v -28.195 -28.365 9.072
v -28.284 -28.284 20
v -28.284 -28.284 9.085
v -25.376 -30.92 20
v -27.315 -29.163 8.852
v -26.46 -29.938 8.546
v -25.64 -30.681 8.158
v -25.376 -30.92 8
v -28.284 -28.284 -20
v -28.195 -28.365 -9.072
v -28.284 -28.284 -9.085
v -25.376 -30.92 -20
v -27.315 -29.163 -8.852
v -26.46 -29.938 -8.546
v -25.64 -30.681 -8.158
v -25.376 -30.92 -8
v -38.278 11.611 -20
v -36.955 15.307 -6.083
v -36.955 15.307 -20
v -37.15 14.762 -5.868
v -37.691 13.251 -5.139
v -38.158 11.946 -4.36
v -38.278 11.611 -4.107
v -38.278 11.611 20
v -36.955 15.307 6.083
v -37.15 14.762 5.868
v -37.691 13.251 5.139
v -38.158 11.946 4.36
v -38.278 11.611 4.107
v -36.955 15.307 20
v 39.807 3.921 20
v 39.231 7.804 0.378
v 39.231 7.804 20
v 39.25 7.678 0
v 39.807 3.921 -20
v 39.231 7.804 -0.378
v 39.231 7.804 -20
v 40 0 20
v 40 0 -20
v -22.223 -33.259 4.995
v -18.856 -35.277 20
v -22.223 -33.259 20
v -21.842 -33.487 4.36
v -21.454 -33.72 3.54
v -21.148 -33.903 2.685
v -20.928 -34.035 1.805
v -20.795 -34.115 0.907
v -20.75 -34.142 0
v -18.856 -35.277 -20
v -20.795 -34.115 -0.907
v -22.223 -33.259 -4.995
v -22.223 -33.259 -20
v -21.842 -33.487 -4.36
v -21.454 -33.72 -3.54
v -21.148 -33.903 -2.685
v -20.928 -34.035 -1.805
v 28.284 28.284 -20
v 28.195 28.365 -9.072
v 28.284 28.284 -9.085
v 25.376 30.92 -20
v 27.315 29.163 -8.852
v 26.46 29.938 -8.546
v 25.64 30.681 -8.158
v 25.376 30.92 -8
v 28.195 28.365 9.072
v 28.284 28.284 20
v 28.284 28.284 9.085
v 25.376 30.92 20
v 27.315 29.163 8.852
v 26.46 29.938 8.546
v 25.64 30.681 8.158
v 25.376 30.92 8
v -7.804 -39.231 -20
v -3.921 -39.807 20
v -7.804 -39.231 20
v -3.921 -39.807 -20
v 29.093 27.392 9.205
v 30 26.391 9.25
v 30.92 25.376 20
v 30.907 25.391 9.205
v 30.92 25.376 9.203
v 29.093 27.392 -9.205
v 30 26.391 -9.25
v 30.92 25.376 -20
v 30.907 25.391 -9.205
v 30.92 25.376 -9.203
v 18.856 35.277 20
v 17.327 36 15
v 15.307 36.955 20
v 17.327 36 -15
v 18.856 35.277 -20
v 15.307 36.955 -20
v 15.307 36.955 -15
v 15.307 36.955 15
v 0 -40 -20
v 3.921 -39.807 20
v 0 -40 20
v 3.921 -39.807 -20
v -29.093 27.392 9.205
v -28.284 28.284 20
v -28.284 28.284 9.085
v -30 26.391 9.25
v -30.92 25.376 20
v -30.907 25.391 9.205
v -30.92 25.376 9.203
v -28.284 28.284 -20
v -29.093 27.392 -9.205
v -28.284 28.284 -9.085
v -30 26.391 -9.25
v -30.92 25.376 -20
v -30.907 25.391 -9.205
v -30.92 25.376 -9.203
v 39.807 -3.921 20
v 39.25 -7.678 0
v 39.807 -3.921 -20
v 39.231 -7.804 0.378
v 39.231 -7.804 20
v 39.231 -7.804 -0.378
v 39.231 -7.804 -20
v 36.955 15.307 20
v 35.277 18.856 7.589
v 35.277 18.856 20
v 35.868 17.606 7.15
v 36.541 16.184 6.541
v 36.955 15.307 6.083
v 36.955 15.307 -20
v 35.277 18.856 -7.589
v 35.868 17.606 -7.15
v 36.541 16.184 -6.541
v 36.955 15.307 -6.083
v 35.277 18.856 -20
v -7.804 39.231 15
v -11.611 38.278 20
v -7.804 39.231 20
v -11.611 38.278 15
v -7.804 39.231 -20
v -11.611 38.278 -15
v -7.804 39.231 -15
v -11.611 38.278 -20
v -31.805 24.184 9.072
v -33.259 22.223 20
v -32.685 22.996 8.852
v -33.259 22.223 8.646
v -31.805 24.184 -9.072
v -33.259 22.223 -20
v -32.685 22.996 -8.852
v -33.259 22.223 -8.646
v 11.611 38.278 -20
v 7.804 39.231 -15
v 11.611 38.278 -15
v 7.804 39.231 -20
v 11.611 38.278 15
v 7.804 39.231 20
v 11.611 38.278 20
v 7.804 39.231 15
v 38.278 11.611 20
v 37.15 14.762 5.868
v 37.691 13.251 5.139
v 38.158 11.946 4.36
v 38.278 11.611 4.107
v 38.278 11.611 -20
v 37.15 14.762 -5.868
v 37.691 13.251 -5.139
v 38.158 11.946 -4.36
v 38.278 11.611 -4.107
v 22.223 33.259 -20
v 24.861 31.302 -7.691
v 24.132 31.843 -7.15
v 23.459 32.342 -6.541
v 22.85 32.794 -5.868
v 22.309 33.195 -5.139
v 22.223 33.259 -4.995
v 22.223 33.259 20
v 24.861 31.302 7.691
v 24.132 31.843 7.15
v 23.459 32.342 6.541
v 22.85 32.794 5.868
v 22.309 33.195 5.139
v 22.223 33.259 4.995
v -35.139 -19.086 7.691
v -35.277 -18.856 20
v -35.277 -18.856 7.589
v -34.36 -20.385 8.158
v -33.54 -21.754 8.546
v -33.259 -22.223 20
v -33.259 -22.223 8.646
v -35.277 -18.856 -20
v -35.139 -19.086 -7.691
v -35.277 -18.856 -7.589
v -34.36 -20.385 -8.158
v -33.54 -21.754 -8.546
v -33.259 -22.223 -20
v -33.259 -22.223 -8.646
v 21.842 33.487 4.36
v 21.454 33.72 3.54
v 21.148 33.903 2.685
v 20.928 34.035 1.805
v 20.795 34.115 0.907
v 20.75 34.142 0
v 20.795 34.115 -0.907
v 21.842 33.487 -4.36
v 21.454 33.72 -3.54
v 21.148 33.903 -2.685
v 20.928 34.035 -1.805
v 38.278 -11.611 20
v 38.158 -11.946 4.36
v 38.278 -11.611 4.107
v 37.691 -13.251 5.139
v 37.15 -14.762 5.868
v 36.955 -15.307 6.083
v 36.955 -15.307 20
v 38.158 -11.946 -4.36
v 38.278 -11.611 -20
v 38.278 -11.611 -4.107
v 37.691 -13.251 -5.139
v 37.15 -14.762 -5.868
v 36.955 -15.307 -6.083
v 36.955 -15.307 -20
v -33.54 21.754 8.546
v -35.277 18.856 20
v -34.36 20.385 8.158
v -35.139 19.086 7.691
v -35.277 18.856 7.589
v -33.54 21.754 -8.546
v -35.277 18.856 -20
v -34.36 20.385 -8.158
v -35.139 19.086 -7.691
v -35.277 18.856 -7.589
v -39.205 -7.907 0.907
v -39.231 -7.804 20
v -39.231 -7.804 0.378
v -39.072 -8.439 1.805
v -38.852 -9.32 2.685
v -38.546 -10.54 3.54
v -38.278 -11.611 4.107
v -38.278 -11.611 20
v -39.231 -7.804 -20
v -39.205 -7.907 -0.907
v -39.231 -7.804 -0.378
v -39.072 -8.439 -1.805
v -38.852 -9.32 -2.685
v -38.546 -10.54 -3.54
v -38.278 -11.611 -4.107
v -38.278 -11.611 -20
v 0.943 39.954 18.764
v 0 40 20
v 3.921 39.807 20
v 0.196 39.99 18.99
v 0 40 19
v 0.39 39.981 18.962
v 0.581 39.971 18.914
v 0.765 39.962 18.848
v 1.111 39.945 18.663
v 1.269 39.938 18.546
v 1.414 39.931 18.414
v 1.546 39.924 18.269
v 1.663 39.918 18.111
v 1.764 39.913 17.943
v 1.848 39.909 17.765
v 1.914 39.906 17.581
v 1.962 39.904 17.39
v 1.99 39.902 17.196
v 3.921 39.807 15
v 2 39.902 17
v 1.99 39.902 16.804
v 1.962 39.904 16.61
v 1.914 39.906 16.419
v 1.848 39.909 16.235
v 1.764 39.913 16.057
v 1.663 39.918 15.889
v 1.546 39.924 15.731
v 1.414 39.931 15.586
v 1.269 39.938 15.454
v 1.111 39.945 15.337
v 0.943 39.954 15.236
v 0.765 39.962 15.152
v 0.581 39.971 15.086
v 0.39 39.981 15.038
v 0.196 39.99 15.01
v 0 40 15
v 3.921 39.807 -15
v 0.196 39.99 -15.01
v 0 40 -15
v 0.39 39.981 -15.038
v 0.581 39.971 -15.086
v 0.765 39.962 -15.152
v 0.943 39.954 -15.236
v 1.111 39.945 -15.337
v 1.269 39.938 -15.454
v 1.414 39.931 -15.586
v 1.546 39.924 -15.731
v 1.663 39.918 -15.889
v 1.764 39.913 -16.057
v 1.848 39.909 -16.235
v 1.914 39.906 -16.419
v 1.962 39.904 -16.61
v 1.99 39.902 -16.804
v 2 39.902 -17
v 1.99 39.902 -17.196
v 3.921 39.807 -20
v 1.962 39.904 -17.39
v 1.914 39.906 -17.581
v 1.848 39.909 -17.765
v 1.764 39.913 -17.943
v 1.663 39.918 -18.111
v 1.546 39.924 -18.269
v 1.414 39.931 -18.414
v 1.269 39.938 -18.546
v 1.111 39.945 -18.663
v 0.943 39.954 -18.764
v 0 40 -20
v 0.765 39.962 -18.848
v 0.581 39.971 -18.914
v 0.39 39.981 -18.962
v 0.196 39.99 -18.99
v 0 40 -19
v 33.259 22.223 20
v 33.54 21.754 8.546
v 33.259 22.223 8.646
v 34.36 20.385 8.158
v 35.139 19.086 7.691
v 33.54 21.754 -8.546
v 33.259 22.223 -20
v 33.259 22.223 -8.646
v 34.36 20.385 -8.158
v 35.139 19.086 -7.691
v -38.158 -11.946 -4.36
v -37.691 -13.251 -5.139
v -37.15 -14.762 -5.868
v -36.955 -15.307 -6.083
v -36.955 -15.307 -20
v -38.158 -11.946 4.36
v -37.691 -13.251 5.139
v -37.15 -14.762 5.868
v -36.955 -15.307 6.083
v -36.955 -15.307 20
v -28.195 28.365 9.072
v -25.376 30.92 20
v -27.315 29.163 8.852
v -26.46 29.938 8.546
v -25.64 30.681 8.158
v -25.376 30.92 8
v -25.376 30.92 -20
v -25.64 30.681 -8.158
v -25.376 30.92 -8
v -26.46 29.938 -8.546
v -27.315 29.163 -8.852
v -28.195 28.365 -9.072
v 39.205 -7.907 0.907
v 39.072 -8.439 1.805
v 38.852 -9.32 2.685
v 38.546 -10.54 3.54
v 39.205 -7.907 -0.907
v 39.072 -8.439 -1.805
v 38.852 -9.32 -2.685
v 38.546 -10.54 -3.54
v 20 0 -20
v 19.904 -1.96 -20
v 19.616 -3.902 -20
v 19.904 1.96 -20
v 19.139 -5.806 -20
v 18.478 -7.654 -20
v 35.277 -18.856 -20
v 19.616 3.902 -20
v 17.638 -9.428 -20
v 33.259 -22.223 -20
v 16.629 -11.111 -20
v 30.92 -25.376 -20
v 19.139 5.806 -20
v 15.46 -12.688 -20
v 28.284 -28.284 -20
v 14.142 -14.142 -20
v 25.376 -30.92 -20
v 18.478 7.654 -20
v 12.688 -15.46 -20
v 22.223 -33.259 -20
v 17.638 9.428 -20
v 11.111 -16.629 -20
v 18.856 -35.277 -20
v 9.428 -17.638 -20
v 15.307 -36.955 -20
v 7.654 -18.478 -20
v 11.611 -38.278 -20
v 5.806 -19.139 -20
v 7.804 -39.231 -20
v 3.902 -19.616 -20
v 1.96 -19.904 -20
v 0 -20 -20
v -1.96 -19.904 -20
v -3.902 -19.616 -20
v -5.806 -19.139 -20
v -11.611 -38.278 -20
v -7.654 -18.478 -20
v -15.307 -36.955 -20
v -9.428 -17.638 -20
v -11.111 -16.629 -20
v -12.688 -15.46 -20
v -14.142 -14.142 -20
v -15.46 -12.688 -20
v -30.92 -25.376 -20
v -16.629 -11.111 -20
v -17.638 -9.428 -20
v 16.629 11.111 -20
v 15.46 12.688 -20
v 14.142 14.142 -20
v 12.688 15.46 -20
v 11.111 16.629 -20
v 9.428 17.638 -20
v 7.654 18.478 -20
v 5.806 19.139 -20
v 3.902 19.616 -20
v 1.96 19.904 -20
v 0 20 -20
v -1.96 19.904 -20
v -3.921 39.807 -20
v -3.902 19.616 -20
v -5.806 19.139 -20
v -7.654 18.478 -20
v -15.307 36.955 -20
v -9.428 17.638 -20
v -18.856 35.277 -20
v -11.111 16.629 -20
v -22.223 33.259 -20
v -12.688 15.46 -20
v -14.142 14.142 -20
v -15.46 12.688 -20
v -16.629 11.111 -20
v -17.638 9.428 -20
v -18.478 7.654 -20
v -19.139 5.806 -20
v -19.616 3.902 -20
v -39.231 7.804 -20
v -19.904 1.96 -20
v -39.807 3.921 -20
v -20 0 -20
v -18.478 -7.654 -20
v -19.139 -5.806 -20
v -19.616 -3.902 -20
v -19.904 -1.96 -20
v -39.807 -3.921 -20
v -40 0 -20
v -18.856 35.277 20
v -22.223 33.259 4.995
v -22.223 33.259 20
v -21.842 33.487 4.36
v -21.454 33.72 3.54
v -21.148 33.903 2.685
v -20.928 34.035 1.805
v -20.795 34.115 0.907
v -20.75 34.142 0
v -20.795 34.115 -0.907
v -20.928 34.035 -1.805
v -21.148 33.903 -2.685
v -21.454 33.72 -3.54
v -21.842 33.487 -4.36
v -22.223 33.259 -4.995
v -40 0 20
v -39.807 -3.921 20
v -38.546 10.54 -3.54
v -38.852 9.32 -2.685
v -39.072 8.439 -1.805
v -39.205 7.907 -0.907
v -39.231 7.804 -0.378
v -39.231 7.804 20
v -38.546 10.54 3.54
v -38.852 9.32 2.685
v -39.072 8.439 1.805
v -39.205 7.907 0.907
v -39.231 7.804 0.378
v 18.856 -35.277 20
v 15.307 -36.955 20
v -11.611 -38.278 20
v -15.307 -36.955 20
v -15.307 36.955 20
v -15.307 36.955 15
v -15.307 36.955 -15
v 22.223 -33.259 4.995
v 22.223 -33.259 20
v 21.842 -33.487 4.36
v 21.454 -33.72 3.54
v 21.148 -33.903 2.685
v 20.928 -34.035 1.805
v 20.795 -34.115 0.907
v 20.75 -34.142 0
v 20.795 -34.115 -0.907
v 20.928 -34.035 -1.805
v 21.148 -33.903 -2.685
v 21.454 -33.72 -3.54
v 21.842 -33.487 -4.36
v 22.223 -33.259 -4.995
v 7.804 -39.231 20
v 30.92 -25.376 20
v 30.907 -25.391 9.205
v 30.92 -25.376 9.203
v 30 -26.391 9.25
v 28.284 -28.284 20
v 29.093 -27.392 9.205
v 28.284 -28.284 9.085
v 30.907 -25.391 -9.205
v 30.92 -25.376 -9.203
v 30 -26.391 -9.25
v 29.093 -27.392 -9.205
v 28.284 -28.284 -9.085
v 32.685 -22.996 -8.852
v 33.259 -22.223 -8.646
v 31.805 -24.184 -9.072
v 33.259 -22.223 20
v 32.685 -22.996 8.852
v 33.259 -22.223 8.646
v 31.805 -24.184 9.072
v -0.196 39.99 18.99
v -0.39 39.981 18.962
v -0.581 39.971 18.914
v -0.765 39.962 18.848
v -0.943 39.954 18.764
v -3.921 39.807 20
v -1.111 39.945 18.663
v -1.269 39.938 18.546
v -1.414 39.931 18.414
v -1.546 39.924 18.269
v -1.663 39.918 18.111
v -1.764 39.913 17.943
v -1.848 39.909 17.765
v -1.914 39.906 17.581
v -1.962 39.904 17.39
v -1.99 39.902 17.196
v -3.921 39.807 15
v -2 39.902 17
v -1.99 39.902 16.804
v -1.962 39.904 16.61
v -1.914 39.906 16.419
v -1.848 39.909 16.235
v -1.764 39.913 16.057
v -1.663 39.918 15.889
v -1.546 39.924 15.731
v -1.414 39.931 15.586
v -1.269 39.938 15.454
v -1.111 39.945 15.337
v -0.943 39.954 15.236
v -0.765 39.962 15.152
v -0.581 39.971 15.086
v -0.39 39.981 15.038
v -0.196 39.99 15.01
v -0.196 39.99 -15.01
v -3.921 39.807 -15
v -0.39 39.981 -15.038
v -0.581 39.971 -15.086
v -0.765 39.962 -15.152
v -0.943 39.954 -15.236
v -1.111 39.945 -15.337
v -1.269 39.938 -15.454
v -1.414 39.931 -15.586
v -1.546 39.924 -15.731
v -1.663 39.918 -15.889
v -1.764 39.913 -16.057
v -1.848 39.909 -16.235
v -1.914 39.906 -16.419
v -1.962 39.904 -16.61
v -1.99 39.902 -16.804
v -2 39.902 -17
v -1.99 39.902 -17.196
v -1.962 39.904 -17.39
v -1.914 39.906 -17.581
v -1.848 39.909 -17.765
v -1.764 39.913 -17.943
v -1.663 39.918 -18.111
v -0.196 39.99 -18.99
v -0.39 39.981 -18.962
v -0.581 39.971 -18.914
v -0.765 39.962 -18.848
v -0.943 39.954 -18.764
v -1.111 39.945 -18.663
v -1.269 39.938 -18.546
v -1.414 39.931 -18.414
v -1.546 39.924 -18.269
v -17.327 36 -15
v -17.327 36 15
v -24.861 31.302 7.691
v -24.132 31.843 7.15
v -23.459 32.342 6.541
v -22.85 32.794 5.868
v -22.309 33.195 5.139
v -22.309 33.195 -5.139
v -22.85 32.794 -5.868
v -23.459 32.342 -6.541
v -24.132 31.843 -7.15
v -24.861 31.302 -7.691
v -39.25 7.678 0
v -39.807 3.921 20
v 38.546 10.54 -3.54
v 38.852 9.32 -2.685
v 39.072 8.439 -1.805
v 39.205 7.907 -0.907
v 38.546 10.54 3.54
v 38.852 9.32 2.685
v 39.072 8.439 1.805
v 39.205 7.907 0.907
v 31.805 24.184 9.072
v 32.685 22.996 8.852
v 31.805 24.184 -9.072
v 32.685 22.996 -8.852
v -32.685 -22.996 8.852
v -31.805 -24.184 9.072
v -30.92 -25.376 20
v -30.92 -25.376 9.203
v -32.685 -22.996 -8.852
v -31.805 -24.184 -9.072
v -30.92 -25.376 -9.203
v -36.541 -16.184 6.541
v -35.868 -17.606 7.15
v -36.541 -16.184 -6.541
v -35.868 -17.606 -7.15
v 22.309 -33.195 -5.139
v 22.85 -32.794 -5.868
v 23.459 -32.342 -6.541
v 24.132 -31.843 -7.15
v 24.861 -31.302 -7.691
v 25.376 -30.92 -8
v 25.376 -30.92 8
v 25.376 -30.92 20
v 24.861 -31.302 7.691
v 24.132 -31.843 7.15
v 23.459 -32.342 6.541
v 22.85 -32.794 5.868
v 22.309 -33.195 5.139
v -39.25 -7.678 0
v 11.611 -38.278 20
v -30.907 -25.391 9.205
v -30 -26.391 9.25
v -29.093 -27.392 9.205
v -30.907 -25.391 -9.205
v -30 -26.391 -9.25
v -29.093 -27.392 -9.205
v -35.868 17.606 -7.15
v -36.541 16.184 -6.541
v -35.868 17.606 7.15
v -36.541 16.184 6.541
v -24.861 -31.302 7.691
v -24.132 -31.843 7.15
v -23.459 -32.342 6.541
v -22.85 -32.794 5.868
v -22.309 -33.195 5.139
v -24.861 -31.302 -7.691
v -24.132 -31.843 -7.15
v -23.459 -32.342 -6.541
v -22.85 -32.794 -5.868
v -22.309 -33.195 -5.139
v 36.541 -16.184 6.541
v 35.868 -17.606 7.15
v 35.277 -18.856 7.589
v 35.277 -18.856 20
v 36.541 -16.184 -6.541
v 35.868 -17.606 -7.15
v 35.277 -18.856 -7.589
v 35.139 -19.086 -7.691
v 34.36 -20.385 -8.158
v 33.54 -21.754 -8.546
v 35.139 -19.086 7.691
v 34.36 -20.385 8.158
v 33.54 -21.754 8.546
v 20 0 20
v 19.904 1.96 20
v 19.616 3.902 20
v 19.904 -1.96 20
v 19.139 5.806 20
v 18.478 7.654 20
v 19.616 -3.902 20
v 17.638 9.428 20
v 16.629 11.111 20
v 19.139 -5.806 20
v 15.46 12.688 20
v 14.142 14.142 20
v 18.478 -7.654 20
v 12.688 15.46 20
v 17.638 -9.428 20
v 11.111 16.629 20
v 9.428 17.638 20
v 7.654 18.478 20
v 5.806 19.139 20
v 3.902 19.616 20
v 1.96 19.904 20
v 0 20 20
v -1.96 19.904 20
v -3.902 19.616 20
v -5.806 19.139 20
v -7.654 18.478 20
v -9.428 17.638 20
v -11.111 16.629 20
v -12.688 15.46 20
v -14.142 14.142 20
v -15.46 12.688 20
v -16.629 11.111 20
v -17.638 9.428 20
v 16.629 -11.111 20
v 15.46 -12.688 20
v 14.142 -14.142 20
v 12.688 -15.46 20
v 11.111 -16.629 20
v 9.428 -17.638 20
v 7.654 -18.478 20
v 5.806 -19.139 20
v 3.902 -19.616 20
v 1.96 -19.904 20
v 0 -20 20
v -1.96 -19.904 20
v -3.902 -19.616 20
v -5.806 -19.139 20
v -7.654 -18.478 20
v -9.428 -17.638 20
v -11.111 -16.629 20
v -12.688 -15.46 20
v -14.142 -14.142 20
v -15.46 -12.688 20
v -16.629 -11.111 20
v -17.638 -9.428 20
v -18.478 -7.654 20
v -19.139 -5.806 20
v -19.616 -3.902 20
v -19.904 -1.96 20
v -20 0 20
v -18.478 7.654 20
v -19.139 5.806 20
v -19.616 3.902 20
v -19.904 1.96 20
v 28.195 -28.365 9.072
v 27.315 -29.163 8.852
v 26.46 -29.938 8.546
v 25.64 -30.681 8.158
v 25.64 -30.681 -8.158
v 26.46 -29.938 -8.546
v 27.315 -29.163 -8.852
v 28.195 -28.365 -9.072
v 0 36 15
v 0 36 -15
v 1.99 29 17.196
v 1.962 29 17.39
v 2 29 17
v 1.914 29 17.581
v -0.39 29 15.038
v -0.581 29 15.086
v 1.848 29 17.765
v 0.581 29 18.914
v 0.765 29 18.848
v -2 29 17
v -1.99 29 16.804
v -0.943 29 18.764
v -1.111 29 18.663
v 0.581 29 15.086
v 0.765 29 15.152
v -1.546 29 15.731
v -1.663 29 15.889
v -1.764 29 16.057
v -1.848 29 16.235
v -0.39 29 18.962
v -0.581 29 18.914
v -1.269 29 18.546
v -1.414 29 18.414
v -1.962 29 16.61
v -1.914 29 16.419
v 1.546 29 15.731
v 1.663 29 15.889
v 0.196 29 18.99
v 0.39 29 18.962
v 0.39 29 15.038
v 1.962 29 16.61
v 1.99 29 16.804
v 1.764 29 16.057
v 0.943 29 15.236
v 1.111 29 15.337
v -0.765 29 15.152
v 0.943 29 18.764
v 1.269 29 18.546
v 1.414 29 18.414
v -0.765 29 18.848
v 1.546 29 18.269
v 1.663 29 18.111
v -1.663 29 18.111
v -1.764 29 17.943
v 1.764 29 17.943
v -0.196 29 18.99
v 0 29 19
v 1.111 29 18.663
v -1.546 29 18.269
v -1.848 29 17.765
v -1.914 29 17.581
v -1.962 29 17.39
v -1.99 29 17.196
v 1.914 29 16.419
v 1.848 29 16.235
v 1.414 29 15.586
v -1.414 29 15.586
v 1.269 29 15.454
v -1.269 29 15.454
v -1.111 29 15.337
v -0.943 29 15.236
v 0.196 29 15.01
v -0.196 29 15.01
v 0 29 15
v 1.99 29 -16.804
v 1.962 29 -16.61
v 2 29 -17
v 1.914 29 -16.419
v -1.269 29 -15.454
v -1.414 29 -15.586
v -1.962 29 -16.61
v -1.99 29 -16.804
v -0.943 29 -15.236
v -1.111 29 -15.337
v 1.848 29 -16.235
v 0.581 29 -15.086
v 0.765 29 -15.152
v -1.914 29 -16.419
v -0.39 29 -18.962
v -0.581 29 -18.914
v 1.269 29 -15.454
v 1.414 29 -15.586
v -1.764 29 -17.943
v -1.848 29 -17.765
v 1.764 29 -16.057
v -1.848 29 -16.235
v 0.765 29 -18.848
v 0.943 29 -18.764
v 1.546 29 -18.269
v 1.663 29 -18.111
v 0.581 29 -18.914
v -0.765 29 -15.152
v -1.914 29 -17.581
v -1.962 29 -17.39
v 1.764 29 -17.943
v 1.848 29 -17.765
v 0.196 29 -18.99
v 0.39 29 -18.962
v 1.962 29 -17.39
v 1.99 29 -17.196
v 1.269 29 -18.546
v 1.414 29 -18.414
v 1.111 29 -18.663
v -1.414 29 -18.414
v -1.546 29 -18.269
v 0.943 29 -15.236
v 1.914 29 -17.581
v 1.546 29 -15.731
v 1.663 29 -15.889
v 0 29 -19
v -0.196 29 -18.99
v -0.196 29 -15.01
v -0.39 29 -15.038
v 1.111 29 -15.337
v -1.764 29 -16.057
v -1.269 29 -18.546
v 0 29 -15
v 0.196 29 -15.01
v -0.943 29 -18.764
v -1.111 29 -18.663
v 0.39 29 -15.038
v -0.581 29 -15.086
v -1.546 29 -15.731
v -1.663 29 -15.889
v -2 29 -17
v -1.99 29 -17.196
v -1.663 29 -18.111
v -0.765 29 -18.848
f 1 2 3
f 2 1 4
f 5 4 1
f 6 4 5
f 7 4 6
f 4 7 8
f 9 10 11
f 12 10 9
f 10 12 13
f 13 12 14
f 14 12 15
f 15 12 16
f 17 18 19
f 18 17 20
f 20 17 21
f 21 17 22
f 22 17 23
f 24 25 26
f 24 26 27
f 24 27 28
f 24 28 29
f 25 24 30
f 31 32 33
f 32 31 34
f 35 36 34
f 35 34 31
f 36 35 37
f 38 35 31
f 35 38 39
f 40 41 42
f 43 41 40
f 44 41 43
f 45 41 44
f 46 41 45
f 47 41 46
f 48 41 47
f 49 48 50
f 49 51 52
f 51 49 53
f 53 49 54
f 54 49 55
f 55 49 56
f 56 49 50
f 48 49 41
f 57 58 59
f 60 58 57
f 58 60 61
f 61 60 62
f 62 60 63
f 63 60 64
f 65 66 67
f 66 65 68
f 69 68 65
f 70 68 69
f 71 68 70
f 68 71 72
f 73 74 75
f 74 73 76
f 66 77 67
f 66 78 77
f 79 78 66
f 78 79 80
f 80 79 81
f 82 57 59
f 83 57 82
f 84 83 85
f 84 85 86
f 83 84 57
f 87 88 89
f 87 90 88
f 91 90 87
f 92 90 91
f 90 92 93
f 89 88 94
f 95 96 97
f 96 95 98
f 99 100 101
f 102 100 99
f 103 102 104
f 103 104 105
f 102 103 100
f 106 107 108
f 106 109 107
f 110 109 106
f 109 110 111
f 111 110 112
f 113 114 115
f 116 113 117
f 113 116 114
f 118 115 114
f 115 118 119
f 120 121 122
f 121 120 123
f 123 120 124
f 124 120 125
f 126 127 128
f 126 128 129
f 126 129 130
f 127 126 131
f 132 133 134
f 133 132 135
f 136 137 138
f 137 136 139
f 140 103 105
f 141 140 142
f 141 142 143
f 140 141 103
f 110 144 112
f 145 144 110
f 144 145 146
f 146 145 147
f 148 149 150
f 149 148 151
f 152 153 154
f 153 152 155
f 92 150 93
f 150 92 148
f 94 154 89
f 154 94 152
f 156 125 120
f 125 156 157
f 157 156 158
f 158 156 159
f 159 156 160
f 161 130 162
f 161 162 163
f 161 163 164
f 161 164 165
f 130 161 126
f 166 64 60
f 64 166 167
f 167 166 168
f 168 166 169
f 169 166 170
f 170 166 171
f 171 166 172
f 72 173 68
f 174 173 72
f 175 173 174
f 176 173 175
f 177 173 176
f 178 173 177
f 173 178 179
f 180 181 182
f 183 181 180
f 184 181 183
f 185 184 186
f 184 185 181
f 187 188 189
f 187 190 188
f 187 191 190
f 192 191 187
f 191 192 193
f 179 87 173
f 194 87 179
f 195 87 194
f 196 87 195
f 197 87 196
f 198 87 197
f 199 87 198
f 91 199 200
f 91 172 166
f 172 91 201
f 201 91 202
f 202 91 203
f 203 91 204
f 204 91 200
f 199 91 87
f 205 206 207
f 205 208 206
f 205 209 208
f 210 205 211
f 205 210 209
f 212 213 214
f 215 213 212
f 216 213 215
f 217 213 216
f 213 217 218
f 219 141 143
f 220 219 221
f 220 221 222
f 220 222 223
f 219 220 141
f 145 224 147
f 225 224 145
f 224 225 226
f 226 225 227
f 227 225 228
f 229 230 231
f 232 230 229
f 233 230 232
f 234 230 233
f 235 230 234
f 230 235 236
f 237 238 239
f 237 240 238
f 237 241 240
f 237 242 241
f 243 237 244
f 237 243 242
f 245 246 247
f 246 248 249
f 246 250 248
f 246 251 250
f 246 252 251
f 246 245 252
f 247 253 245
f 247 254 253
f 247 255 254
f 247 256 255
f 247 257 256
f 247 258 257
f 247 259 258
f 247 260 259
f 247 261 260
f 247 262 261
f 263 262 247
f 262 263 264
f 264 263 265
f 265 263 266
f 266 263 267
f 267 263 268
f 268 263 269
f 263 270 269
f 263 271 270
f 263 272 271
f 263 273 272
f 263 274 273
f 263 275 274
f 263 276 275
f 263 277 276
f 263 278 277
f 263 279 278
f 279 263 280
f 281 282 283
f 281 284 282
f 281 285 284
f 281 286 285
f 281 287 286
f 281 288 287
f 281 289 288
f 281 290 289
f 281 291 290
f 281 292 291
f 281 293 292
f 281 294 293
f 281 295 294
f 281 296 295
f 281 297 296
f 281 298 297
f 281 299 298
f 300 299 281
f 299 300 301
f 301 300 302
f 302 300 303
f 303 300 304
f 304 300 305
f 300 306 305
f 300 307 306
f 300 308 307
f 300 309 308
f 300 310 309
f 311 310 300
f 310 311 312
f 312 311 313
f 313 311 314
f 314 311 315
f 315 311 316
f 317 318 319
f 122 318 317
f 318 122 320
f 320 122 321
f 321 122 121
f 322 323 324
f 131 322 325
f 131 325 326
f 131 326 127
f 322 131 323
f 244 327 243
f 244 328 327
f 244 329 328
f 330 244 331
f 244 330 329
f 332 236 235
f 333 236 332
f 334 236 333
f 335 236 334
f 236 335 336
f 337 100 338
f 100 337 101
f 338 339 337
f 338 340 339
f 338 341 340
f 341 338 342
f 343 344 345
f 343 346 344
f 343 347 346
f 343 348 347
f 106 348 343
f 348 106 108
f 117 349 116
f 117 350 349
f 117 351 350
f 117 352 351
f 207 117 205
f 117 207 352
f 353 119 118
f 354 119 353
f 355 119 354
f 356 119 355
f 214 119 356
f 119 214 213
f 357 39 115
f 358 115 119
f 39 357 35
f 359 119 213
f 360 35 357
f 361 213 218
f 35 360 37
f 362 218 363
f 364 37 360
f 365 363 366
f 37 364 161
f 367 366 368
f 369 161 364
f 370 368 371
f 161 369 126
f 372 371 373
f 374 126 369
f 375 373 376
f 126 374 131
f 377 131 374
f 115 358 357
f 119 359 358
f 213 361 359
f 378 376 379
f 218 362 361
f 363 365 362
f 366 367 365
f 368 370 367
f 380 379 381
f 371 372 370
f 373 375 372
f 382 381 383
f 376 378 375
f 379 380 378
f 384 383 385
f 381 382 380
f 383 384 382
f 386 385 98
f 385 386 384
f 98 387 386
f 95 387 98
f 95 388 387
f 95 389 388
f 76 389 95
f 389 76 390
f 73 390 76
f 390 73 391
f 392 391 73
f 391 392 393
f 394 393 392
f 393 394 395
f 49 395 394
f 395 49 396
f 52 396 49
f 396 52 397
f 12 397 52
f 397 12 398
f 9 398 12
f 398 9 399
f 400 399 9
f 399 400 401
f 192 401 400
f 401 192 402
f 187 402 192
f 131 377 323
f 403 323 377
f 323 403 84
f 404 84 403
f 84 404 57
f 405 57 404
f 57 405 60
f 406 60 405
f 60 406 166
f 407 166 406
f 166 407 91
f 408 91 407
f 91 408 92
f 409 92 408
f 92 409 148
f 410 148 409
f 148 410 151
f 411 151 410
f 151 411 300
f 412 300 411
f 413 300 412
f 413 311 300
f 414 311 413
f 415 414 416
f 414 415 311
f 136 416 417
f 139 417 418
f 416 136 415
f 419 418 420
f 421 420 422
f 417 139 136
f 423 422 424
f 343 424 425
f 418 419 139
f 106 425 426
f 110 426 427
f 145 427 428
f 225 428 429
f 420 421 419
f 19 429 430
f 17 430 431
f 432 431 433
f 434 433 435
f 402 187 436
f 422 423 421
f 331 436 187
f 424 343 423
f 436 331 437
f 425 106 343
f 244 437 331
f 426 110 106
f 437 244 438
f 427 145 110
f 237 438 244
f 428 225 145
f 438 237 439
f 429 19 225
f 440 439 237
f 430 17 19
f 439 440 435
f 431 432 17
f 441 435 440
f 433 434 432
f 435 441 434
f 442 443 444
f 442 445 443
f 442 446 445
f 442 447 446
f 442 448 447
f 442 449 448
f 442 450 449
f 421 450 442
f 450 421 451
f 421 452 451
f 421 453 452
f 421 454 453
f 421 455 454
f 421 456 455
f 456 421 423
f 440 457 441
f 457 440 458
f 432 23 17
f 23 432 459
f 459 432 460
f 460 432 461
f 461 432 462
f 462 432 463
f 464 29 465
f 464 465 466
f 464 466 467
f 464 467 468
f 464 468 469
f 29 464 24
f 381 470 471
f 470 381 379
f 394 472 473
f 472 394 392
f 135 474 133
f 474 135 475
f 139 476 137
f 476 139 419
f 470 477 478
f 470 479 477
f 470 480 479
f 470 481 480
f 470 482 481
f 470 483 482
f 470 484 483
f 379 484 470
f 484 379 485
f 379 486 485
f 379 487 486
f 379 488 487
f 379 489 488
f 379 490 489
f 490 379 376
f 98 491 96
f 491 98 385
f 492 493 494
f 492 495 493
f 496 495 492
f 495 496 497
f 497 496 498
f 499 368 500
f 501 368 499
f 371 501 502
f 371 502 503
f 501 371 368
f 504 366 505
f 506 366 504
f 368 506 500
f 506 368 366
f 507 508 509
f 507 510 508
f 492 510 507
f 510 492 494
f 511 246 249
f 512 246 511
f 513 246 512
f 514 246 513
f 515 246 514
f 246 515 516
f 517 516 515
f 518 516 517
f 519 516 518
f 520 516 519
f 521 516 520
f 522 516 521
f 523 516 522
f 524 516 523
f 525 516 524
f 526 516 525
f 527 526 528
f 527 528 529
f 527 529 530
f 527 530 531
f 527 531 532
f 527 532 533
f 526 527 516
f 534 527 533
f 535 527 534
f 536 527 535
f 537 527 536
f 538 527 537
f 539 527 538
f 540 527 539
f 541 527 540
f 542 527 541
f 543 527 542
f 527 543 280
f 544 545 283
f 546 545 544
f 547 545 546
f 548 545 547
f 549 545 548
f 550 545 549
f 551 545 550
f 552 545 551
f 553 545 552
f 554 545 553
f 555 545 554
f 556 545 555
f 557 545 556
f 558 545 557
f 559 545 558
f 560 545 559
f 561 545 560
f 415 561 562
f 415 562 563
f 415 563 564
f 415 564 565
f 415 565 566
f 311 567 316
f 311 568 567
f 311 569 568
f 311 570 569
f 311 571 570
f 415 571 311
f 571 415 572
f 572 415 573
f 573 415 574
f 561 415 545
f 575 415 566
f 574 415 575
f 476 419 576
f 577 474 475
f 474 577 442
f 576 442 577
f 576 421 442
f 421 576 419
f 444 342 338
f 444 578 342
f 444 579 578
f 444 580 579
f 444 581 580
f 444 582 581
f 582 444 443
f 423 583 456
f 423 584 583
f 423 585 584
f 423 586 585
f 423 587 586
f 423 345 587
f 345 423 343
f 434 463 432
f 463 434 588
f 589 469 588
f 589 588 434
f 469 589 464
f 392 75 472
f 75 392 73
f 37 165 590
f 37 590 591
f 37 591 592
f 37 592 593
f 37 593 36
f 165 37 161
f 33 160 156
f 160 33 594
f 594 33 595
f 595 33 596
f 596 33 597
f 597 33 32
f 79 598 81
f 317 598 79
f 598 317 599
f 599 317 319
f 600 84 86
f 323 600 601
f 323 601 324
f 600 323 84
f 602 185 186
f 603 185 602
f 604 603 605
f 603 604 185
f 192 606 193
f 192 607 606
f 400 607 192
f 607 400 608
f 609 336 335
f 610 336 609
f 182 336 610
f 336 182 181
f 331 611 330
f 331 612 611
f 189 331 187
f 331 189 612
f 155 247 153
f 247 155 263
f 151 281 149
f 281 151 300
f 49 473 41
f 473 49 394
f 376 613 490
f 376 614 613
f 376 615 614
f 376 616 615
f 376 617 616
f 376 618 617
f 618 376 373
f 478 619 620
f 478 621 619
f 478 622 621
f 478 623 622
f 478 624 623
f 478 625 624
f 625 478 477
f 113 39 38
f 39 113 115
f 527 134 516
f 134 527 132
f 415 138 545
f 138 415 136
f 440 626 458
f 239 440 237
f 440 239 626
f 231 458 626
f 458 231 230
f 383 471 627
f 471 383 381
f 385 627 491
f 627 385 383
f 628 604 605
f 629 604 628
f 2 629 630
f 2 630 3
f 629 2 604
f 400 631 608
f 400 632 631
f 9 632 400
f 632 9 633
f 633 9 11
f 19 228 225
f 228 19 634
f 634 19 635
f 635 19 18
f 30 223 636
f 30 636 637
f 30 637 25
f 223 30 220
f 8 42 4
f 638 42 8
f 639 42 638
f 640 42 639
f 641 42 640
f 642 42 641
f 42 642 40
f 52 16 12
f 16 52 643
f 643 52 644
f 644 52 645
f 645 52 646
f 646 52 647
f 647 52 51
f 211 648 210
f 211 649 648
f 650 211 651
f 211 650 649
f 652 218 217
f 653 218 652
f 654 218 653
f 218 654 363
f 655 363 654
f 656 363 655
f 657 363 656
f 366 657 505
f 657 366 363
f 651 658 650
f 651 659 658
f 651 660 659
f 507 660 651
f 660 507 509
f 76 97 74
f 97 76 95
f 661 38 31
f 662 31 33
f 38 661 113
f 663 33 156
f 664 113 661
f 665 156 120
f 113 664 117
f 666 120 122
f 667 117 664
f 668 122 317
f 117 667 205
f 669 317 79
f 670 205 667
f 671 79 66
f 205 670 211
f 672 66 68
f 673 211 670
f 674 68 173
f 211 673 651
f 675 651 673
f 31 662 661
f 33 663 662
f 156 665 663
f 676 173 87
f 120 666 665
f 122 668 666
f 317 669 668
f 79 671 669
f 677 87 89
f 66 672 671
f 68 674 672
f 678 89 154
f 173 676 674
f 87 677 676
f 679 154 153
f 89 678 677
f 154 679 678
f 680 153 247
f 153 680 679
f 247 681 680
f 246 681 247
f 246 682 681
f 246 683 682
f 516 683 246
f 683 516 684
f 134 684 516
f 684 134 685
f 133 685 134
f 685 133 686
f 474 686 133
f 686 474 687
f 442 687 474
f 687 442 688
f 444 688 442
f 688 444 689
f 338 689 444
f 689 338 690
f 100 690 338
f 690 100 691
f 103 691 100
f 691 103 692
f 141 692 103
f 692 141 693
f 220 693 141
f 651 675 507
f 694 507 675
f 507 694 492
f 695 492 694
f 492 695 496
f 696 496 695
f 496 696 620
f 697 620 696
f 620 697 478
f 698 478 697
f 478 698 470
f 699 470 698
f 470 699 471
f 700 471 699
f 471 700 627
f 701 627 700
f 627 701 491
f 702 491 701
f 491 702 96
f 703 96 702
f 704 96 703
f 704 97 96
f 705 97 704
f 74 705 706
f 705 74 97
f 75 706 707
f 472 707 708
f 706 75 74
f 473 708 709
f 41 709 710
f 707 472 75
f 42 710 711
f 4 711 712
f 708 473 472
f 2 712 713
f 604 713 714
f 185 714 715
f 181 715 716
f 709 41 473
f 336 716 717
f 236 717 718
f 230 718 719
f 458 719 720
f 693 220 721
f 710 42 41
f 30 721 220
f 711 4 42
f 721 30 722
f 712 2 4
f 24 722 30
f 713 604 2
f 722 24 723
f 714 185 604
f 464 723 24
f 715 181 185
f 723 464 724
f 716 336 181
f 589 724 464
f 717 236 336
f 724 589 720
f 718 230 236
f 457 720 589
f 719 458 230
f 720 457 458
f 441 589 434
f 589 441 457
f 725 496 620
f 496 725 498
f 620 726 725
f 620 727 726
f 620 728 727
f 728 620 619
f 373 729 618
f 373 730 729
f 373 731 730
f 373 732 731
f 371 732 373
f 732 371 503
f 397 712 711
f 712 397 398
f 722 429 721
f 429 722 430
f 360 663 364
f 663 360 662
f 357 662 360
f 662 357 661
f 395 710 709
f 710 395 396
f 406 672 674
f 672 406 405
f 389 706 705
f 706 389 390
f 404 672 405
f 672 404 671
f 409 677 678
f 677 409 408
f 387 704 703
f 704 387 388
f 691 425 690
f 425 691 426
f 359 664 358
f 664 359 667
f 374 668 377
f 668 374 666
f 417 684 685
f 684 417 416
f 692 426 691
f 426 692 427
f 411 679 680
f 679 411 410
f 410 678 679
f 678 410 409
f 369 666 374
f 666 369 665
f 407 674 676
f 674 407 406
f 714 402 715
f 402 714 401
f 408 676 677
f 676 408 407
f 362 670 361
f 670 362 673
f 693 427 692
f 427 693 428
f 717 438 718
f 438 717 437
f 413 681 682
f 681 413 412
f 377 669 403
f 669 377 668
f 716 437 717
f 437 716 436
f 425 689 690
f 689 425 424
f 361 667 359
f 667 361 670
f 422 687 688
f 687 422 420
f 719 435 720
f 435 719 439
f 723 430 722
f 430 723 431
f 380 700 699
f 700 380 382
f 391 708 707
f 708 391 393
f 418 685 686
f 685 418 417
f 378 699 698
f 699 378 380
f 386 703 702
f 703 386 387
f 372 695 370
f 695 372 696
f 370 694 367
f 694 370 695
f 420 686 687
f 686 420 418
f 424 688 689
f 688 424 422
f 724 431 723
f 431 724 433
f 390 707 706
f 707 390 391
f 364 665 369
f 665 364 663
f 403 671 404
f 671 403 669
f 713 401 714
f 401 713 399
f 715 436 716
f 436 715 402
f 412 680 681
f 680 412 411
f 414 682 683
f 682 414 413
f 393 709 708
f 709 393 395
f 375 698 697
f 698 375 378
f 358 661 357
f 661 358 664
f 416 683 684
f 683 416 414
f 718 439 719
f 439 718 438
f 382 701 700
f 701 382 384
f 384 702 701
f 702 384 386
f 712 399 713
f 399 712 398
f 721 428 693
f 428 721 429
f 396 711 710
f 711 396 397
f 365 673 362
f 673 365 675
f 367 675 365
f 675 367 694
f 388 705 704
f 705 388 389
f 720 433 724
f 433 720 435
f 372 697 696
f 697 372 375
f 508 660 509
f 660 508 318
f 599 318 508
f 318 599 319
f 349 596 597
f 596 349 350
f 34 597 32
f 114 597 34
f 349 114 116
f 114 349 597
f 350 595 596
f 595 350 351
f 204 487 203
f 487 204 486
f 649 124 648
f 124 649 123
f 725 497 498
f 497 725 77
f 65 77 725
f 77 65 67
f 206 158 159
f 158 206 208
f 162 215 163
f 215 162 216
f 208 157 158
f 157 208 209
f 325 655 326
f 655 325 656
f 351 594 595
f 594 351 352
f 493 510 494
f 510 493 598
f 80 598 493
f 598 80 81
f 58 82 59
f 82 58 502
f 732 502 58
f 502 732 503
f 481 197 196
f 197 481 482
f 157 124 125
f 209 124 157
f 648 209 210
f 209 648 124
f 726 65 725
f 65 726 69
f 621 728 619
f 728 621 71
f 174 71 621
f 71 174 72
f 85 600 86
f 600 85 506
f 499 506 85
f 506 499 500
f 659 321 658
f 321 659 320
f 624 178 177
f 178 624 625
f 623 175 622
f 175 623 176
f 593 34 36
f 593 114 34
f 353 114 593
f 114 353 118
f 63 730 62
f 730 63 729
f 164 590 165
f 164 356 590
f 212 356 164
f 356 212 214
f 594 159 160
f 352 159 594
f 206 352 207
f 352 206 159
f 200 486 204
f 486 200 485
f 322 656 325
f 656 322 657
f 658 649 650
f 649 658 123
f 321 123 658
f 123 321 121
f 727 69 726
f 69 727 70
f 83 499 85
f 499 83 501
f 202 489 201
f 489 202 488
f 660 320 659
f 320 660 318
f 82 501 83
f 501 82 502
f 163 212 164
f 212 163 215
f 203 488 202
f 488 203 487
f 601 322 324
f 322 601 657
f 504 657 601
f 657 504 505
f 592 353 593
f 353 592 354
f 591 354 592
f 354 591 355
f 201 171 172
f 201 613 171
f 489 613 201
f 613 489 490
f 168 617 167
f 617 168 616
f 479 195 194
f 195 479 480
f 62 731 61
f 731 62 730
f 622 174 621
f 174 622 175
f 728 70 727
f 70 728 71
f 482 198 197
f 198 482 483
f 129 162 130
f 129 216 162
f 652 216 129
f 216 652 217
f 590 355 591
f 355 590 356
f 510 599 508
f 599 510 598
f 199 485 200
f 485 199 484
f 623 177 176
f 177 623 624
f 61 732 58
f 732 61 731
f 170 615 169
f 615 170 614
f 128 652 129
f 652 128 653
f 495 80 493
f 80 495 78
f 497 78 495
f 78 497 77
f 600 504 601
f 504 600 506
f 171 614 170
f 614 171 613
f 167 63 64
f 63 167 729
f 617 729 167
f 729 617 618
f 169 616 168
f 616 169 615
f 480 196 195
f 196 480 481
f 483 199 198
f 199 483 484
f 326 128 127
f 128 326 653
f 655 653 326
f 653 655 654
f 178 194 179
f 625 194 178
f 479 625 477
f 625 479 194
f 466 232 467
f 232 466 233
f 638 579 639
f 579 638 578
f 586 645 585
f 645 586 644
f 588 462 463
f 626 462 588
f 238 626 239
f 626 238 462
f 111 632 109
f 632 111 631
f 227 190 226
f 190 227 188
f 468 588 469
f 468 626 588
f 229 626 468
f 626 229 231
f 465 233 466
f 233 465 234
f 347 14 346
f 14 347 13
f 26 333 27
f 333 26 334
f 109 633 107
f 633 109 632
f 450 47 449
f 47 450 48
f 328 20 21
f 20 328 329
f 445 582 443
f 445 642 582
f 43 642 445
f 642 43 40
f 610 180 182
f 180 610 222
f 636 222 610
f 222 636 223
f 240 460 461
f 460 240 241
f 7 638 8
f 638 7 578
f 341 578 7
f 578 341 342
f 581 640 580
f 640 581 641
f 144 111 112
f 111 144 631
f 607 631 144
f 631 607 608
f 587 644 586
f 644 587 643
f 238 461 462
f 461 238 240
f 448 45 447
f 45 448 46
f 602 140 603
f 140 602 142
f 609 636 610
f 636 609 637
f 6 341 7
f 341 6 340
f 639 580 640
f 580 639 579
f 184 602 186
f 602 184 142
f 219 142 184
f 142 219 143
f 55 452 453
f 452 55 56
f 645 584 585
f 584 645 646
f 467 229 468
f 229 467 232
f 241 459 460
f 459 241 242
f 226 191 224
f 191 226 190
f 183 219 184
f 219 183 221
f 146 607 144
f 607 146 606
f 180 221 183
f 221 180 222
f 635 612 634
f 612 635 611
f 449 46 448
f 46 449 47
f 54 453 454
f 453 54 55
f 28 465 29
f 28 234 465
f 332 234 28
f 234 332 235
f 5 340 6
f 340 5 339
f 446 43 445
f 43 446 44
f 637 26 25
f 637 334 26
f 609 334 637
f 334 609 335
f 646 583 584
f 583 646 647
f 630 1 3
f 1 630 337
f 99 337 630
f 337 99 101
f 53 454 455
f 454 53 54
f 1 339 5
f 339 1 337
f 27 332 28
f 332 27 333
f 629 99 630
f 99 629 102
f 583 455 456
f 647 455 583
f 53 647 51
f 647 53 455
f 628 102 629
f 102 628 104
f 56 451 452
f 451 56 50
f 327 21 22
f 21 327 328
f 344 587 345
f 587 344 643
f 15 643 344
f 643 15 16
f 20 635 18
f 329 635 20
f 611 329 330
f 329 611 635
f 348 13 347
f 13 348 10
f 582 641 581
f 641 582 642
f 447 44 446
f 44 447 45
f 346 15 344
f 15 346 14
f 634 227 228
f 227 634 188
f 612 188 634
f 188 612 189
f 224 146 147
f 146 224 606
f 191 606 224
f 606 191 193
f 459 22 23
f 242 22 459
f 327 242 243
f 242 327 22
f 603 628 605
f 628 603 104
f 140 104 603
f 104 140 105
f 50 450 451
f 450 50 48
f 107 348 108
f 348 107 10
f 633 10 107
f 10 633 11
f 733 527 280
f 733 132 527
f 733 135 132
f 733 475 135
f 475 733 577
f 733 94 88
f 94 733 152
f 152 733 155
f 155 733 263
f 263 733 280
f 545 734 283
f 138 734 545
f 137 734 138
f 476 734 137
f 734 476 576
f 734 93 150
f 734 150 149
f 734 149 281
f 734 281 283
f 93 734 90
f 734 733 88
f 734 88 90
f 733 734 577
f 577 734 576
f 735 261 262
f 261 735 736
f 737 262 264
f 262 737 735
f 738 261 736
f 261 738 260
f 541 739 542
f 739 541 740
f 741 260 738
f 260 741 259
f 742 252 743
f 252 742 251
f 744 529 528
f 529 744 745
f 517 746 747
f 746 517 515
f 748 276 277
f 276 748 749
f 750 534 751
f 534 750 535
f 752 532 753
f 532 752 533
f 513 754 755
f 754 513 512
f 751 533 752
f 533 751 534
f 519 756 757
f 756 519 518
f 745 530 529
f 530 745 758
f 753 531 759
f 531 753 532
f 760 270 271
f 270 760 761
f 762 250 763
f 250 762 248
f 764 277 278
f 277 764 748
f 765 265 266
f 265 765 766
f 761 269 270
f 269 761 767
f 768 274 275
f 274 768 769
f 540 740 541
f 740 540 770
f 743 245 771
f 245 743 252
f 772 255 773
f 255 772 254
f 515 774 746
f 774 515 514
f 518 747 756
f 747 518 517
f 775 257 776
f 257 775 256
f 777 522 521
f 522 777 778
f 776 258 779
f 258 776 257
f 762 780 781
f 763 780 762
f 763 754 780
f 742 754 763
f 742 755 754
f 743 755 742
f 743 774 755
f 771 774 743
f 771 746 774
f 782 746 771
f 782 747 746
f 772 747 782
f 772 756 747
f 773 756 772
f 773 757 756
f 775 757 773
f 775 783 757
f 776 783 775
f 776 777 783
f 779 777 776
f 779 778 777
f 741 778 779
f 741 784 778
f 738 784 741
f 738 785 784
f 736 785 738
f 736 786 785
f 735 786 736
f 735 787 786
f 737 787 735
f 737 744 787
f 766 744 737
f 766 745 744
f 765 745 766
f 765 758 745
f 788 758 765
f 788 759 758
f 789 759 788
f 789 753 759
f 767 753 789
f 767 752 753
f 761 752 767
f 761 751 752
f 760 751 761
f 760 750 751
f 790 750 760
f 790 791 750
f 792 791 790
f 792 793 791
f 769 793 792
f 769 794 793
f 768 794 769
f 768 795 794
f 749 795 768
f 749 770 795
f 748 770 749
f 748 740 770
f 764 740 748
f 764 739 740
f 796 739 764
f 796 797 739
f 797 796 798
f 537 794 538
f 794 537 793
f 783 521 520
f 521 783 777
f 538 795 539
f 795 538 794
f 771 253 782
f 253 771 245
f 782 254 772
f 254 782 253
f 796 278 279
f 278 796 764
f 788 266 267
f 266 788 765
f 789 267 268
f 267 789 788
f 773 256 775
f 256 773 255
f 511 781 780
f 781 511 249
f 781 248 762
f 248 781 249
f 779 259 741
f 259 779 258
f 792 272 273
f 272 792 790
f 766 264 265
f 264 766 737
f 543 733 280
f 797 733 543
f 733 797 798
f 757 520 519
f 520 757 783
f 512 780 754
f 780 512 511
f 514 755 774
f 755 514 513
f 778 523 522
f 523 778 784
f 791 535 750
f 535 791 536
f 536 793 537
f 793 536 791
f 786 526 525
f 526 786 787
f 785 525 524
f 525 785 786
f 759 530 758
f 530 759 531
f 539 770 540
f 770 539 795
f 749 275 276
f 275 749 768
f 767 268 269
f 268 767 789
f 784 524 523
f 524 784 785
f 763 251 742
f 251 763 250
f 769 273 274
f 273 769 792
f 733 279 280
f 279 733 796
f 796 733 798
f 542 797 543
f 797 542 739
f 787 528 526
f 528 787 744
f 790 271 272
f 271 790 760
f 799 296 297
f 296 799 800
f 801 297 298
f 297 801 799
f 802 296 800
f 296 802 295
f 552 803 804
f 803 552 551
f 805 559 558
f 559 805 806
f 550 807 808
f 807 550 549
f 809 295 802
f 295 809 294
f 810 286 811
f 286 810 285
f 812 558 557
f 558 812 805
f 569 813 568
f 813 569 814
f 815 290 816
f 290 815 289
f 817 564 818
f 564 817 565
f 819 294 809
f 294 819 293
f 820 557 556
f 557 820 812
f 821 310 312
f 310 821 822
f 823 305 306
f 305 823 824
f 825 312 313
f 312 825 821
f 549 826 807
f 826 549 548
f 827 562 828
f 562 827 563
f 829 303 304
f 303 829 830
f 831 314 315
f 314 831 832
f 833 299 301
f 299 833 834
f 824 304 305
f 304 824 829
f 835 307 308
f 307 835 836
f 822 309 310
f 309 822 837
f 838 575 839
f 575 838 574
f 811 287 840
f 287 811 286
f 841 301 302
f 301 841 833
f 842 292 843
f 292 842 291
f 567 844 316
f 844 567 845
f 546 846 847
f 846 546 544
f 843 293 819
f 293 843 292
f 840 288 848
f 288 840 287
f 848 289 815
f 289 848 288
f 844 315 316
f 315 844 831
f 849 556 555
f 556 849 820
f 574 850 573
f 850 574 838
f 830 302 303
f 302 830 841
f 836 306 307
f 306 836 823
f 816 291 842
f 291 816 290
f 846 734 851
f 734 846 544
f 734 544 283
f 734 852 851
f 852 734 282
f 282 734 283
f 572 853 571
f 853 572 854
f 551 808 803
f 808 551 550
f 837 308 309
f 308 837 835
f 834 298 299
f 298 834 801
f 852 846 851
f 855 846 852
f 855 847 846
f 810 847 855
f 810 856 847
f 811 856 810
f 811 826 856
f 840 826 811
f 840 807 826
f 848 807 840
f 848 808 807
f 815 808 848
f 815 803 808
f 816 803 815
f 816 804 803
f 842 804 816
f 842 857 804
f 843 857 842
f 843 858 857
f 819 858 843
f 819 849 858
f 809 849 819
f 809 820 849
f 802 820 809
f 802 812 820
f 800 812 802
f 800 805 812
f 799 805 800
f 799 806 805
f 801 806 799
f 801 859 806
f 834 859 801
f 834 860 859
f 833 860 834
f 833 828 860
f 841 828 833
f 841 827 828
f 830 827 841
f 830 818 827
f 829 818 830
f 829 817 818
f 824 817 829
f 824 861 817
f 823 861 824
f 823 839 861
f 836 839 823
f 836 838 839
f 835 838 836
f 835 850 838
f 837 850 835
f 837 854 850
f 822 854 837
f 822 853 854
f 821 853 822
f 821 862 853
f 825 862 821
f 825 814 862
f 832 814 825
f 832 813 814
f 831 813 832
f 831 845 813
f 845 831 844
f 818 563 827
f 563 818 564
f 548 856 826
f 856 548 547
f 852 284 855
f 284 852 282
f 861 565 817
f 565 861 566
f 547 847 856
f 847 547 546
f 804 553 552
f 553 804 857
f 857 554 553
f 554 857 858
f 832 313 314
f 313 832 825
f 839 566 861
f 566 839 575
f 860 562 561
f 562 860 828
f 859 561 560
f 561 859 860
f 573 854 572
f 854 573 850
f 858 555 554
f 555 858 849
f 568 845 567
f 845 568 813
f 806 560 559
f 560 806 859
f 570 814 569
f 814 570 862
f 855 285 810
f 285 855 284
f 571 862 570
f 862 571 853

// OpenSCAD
// COBRA Vertebra - T9 V15
// Height: 40.0mm, OD: 80.0mm

$fn = 64;

difference() {
    // Outer cylinder
    cylinder(h=40.0, d=80.0, center=true);
    
    // Inner channel
    cylinder(h=42.0, d=40.0, center=true);

    // Battery cavity 1
    rotate([0, 0, 0])
    translate([30.0, 0, 0])
    rotate([90, 0, 0])
    cylinder(h=74.0, d=18.5, center=true);

    // Battery cavity 2
    rotate([0, 0, 180])
    translate([30.0, 0, 0])
    rotate([90, 0, 0])
    cylinder(h=74.0, d=18.5, center=true);

    // Solar panel cavity
    translate([0, 38.0, 0])
    cube([50, 4, 30], center=true);

    // Pivot holes
    translate([0, 40.0, 17.0])
    rotate([90, 0, 0])
    cylinder(h=22.0, d=4, center=true);
    
    translate([0, 40.0, -17.0])
    rotate([90, 0, 0])
    cylinder(h=22.0, d=4, center=true);
}
